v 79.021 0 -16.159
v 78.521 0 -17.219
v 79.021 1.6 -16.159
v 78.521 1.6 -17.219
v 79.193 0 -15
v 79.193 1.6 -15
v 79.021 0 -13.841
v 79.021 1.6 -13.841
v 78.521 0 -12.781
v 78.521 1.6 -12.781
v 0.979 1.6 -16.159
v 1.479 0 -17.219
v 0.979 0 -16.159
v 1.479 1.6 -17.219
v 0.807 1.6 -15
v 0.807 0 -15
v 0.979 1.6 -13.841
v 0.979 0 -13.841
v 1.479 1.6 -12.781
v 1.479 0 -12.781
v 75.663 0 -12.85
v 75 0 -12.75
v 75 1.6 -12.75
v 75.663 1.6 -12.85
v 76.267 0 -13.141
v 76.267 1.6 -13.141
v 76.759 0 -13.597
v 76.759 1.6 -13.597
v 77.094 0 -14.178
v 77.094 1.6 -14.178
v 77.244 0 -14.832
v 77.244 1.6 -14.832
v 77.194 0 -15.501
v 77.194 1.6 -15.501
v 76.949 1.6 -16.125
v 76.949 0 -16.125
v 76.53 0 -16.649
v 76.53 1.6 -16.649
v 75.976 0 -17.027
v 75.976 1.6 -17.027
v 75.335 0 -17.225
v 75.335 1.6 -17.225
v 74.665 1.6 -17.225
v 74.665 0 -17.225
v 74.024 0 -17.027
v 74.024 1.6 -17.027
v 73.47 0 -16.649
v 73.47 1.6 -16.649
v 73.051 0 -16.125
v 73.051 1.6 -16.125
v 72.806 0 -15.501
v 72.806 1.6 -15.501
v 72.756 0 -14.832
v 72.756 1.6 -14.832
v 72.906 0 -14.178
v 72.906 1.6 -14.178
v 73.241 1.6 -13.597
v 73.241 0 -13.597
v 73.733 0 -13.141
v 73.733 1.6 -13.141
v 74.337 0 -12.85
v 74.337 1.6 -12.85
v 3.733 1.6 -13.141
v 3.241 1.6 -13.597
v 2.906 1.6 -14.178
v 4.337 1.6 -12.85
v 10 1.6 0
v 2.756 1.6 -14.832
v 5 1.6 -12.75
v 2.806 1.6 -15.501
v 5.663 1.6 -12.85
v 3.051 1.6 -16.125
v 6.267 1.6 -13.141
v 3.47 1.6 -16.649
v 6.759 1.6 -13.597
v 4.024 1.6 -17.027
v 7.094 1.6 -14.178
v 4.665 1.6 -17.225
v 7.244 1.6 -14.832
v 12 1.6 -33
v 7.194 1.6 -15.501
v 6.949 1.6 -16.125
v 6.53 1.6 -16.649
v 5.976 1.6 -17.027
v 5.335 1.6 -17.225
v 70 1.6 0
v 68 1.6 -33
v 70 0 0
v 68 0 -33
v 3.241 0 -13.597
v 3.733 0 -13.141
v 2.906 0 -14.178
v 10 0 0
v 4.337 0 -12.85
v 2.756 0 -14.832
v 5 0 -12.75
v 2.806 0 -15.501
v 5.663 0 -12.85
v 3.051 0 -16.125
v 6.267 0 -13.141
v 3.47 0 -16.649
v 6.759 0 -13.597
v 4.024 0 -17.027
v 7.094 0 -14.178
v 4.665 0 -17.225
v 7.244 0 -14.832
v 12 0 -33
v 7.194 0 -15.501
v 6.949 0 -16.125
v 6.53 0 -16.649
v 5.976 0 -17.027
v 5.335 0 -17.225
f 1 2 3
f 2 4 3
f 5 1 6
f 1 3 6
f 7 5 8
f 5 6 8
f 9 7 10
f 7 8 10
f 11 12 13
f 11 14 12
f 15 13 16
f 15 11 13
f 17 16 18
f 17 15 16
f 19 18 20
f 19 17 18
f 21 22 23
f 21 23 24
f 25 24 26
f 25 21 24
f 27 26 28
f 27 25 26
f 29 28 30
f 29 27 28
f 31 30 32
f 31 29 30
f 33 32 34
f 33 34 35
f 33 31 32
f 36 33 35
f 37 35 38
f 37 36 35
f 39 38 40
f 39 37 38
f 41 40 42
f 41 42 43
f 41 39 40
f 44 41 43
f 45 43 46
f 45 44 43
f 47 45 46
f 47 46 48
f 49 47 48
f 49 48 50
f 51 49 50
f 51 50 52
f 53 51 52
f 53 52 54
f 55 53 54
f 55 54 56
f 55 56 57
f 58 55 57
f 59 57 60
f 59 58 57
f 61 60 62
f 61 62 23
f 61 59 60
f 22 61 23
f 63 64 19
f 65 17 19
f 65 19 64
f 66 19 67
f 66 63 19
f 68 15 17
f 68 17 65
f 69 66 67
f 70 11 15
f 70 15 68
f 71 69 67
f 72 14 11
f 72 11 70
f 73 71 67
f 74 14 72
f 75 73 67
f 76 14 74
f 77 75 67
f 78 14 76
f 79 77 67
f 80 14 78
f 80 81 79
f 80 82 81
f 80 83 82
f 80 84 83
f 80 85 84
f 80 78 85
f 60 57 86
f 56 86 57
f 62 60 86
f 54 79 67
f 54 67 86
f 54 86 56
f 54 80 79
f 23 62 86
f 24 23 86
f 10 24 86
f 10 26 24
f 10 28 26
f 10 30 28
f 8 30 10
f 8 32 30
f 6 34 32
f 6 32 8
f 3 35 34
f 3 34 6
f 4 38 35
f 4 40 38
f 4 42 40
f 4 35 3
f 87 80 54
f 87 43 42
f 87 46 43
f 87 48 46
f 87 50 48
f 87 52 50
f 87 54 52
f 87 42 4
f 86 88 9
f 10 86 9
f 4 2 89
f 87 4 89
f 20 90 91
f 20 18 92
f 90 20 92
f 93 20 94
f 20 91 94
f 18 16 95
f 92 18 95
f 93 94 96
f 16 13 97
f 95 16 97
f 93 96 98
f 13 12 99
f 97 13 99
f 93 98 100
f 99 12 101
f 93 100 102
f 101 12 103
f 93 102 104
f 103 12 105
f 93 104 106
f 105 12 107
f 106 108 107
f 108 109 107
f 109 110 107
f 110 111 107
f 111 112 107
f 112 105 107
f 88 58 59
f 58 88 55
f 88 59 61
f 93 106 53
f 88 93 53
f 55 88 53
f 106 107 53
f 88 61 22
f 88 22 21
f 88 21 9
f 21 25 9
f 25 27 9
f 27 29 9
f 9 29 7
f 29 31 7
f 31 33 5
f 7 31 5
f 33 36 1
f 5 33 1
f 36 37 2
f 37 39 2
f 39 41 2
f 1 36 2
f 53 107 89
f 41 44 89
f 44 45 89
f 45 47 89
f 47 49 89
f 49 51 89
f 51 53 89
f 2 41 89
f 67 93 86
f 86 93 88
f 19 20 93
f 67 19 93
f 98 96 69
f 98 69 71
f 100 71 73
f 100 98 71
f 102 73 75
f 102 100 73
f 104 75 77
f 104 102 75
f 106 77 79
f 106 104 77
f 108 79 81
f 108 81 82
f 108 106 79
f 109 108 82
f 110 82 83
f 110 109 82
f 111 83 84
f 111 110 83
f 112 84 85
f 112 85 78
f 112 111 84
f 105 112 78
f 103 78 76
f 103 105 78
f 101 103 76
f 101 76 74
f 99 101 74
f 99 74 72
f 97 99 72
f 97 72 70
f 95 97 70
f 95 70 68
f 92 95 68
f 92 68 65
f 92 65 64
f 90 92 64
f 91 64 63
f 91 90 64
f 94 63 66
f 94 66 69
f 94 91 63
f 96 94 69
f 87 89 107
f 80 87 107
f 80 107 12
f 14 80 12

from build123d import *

# Parameters (mm, degrees)
SKETCH1_R           = 2.25
BOSS_EXTRUDE1_DEPTH = 1.6
FILLET1_R           = 4


with BuildPart() as part:
    # Sketch1 → Boss-Extrude1 (new body)
    with BuildSketch(Plane(origin=(0, 0, 0), x_dir=(1, 0, 0), z_dir=(0, 1, 0))):
        Polygon((12, 33), (0, 15), (10, 0), (70, 0), (80, 15), (68, 33), align=None)
        with Locations(Location((5, 15, 0), (0, 0, 270))):
            Circle(SKETCH1_R, mode=Mode.SUBTRACT)
        with Locations(Location((75, 15, 0), (0, 0, 270))):
            Circle(SKETCH1_R, mode=Mode.SUBTRACT)
    extrude(amount=BOSS_EXTRUDE1_DEPTH)

    # Fillet1
    fillet1_edges = [part.edges().sort_by_distance(p)[0] for p in [
        (0, 0.8, -15),
        (80, 0.8, -15),
    ]]
    fillet(fillet1_edges, radius=FILLET1_R)


solid = part.part
